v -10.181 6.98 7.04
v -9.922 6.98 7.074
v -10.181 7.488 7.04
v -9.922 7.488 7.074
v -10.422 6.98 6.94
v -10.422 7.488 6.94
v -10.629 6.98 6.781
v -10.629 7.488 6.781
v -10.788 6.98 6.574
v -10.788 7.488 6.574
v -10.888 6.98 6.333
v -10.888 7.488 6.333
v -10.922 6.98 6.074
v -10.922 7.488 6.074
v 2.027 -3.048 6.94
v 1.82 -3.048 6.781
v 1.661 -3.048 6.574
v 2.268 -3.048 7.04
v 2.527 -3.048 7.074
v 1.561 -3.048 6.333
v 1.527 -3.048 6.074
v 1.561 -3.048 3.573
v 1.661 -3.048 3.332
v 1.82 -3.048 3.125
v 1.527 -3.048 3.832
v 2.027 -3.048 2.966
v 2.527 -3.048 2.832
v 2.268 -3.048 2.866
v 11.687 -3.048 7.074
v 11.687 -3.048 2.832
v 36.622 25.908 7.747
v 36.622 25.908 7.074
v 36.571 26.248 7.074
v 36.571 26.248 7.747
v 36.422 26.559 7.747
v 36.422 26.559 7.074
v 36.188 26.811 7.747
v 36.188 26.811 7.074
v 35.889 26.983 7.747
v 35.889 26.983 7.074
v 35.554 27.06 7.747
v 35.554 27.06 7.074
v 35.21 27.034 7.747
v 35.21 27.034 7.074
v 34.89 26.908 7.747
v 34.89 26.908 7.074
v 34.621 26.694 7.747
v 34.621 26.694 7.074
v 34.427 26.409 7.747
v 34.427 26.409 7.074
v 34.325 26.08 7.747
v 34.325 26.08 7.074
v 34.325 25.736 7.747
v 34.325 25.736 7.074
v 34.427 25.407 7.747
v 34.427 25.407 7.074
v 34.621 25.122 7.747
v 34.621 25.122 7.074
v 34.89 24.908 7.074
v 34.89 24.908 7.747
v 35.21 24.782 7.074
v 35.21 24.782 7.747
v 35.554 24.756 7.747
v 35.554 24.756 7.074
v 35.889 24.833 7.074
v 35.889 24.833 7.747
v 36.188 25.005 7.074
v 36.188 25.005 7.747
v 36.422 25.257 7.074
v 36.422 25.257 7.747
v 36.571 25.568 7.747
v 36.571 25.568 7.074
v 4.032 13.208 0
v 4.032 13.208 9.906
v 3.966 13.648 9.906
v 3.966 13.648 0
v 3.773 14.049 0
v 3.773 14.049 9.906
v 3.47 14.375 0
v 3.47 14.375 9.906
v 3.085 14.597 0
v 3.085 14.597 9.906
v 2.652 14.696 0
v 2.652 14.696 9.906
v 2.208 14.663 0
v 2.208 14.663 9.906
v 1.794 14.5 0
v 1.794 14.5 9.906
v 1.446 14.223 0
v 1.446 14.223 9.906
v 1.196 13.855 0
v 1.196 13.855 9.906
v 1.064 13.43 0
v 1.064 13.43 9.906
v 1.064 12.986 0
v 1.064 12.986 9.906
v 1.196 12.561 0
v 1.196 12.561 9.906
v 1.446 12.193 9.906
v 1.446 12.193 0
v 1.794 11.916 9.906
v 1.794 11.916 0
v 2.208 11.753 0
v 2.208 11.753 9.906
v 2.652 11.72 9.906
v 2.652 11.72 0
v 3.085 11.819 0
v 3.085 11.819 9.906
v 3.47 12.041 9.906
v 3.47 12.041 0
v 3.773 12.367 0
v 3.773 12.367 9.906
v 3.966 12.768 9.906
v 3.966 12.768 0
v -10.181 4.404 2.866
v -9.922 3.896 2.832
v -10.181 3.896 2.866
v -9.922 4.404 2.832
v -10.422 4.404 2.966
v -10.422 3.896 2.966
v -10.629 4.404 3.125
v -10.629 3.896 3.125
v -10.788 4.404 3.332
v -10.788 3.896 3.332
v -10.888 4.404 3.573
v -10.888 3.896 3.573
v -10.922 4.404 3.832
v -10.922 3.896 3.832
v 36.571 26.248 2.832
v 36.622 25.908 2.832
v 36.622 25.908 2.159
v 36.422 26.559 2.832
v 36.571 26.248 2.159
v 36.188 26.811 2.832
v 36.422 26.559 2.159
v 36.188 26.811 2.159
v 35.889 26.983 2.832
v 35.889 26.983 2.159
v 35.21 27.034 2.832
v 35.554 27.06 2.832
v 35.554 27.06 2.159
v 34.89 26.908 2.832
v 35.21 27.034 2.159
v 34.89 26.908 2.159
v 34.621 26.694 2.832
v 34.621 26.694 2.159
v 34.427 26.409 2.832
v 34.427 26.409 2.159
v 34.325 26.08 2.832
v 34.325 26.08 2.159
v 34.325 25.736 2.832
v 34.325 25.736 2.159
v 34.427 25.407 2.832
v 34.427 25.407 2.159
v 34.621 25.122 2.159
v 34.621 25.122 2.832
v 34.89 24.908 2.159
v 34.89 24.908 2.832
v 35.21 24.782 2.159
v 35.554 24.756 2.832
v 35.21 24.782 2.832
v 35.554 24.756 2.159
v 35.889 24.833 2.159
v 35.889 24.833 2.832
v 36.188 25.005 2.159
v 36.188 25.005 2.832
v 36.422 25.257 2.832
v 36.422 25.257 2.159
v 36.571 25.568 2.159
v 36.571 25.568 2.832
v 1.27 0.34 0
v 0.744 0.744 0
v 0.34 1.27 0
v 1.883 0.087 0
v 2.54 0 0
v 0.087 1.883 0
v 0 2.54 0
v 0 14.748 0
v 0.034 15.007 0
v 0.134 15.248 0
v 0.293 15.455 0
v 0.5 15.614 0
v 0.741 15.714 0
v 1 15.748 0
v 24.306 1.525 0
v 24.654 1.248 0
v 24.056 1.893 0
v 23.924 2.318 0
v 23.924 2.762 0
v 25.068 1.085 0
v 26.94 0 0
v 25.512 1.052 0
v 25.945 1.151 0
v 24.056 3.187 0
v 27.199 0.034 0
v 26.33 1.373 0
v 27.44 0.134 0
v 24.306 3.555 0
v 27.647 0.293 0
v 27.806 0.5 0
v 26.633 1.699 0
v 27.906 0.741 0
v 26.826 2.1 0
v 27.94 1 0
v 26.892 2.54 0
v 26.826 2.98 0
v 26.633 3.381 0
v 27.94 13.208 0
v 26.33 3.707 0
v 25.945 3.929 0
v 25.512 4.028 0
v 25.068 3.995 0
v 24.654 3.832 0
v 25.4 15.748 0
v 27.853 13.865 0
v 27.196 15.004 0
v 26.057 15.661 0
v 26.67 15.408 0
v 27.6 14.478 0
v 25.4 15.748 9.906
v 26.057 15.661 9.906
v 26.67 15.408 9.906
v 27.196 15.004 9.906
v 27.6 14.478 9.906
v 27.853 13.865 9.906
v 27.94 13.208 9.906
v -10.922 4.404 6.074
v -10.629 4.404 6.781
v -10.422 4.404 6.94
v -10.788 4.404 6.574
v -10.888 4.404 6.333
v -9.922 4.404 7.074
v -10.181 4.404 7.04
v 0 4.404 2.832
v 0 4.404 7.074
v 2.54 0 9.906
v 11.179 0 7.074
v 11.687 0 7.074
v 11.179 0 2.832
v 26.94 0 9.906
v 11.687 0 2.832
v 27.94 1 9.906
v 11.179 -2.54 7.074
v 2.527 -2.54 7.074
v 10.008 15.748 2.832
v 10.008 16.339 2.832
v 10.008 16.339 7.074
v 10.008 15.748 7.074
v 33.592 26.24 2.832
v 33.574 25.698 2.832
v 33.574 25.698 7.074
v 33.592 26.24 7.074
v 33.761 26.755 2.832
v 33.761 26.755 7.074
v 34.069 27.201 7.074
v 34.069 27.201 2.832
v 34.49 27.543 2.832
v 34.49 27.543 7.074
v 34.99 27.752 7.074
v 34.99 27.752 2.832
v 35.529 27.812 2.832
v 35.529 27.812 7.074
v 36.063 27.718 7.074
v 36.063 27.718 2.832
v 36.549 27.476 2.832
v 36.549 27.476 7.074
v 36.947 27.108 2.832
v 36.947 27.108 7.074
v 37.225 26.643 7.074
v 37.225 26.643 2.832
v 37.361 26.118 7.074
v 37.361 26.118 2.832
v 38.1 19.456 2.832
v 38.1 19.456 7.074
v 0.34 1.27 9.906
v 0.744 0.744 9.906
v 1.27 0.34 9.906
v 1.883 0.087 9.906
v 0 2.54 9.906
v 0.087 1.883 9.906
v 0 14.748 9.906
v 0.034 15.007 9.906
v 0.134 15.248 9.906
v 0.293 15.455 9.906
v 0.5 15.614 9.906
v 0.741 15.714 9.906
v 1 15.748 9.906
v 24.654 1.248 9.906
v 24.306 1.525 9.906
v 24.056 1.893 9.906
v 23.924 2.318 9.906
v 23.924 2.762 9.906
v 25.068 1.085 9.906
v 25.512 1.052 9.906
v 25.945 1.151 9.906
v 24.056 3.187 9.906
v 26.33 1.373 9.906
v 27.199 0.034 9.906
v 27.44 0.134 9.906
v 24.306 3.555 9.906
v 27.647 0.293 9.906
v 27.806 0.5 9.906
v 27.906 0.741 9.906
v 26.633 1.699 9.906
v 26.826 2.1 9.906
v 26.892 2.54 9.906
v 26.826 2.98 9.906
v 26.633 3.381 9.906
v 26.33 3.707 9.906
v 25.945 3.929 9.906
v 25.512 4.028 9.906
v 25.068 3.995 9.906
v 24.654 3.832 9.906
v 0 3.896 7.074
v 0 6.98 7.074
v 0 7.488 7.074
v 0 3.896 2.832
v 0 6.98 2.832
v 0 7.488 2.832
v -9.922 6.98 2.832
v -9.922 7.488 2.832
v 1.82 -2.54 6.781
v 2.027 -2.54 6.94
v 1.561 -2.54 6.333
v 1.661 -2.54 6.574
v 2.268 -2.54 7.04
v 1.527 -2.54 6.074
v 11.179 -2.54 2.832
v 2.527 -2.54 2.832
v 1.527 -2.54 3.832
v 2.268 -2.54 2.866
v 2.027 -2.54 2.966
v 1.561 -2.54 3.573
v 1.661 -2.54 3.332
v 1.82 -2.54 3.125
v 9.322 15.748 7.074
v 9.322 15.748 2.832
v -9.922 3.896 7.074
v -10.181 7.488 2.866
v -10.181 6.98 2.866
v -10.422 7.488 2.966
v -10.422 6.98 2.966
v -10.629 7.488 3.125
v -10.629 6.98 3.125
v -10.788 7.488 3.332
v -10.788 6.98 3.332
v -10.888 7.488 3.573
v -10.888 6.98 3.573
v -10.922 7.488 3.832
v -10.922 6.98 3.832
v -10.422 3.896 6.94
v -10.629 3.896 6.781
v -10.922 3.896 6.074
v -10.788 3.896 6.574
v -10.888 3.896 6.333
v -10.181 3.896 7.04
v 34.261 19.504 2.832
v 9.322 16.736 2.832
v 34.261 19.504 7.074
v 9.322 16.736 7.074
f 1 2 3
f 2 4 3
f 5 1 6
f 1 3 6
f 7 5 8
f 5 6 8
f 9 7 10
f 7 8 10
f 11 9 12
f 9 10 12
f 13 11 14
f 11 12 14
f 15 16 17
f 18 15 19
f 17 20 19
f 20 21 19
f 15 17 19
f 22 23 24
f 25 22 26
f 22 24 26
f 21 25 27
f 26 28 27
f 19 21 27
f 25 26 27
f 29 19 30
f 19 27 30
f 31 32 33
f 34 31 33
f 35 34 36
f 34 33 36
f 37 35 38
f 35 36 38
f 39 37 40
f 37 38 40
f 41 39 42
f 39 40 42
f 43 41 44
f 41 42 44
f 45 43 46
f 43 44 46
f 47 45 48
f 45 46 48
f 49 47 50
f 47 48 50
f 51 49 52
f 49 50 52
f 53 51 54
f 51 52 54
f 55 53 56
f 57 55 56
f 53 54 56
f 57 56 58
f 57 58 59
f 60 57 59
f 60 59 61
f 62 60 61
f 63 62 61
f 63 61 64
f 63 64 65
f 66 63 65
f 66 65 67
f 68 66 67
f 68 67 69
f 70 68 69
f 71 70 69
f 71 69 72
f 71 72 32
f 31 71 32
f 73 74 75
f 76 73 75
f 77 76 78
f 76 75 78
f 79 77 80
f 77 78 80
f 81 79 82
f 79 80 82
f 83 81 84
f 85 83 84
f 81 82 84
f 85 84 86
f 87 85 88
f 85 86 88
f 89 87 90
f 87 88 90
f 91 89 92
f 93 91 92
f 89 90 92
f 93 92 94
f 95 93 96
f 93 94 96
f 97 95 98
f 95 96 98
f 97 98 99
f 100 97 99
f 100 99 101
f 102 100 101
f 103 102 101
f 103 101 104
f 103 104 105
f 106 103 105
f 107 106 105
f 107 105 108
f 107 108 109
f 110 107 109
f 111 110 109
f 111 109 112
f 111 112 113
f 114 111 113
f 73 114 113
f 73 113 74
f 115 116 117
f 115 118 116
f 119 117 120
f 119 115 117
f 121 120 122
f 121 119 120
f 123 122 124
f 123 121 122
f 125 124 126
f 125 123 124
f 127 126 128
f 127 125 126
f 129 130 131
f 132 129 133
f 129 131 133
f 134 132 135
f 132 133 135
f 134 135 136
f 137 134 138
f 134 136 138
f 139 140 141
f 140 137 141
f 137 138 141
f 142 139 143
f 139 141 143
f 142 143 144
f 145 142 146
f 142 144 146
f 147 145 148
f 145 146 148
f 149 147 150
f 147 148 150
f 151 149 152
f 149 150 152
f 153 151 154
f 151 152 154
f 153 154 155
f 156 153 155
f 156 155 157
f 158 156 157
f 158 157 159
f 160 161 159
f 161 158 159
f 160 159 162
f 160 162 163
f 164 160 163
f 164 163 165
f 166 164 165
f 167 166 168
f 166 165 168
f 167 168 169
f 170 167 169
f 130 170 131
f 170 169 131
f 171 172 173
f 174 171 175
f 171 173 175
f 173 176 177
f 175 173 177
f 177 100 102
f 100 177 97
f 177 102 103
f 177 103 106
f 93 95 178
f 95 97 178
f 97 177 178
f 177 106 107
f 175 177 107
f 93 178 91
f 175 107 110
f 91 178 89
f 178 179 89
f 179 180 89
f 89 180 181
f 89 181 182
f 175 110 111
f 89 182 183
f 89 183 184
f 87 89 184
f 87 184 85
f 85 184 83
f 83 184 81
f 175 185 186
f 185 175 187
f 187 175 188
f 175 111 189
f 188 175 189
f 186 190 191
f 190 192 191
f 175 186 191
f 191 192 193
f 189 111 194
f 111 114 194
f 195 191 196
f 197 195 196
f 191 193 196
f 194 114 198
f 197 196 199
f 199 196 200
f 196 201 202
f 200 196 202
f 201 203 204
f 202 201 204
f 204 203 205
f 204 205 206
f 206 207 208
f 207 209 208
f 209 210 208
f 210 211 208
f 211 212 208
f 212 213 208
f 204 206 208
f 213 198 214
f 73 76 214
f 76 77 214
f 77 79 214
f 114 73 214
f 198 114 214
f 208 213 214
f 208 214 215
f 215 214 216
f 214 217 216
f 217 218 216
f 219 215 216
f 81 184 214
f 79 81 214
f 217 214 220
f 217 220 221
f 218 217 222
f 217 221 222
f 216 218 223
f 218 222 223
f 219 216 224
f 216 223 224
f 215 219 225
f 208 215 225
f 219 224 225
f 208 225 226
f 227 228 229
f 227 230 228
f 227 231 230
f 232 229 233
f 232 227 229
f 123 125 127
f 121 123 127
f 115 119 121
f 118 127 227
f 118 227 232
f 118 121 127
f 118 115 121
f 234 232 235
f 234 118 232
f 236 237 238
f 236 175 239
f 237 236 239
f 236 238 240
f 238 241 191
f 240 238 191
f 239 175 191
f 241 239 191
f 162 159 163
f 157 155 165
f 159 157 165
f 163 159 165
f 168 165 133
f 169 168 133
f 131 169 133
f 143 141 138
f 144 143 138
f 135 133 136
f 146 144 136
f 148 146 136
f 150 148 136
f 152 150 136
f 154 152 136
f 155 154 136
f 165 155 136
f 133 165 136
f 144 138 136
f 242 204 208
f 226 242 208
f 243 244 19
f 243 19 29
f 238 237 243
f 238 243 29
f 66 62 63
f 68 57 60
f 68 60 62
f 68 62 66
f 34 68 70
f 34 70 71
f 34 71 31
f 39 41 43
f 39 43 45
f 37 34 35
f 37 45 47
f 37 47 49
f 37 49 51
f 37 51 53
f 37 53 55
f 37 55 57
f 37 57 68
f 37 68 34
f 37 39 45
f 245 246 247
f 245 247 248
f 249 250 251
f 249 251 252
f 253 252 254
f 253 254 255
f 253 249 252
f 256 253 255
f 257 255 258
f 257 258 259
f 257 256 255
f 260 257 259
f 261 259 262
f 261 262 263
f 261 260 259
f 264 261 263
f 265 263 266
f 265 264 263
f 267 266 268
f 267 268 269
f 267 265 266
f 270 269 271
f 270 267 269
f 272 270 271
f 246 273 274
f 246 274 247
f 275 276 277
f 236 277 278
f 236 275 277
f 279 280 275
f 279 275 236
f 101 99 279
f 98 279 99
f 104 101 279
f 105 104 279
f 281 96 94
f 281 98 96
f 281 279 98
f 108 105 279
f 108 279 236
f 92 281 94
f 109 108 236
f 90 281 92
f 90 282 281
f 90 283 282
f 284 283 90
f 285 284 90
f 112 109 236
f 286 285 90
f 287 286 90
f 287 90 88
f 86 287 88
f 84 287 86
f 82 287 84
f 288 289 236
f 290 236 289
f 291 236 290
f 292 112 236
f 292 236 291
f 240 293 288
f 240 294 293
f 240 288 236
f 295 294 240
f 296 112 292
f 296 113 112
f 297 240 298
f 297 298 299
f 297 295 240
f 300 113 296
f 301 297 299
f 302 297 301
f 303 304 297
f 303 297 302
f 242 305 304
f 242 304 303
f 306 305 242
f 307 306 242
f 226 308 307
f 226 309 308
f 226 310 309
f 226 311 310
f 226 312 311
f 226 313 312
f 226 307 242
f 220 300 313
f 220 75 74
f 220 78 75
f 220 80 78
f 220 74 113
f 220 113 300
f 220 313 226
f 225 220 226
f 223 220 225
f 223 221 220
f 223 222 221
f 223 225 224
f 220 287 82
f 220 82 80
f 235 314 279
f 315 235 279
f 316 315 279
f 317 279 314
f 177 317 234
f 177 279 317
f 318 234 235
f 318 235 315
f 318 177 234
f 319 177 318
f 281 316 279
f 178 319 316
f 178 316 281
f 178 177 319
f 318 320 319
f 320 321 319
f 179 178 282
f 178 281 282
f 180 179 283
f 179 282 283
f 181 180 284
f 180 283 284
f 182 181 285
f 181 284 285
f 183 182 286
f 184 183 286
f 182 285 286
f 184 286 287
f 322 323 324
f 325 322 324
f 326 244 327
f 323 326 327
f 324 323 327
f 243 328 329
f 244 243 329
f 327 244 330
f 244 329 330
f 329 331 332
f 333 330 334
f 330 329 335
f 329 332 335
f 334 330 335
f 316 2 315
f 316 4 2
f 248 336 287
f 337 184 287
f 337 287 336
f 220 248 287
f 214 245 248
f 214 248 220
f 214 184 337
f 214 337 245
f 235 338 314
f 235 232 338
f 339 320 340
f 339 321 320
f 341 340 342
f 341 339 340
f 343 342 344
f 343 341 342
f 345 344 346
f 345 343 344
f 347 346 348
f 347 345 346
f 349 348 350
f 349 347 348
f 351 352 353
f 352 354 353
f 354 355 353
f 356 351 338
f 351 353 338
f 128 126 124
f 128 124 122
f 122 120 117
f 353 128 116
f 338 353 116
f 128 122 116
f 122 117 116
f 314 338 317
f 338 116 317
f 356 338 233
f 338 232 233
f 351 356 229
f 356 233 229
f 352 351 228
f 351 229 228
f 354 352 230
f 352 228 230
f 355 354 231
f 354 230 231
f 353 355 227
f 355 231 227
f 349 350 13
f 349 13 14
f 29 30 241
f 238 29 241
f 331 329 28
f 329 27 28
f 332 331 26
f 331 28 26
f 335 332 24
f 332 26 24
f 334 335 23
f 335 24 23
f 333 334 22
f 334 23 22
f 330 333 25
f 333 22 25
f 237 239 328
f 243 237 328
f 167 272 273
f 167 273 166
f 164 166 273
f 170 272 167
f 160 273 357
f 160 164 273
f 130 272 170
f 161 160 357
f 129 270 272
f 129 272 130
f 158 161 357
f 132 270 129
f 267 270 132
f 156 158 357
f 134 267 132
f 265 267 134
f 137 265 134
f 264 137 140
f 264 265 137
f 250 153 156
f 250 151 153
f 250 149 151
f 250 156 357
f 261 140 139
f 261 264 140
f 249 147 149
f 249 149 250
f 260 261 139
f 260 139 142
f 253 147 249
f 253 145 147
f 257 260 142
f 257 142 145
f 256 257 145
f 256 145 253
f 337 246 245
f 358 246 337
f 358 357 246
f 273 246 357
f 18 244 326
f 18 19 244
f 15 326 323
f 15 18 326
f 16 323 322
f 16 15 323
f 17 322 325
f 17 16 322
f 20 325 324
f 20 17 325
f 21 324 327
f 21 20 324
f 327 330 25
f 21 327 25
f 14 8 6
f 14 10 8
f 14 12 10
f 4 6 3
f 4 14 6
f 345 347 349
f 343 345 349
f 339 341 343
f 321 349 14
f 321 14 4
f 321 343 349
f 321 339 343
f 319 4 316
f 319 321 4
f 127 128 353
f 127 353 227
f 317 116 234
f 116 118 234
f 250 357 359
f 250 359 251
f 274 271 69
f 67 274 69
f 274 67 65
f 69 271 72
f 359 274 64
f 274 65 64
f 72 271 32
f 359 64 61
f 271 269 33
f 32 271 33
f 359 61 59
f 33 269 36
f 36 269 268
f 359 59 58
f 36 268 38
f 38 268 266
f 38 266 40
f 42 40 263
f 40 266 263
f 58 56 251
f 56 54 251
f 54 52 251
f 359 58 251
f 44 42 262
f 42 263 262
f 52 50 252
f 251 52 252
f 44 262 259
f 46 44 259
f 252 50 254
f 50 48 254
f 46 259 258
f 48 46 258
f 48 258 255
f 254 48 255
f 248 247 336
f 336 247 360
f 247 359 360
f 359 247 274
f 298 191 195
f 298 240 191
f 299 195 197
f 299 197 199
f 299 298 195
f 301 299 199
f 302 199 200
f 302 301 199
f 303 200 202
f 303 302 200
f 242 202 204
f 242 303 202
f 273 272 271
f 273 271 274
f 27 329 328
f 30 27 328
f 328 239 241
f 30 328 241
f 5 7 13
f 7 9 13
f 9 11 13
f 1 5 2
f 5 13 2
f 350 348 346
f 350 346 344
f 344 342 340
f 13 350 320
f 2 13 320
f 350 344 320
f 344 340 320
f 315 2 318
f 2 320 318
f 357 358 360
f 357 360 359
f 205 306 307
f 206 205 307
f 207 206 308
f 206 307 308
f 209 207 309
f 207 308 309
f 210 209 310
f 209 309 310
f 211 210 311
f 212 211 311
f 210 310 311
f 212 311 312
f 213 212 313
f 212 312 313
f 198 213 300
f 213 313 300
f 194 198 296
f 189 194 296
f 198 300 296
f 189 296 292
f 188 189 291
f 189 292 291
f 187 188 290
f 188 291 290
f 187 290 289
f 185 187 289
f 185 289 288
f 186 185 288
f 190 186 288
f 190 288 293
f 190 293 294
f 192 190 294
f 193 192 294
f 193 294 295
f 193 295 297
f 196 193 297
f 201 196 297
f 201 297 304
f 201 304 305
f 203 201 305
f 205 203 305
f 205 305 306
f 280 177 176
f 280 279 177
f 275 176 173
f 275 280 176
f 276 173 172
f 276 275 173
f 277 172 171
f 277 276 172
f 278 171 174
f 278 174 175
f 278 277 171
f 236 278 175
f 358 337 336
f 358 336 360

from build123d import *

# Parameters (mm, degrees)
SKETCH1_W                = 27.94
SKETCH1_H                = 15.748
BOSS_EXTRUDE1_DEPTH      = 9.906
SKETCH2_R                = 1.49225
CUT_EXTRUDE1_DEPTH       = 34.567423792
FILLET1_R                = 2.54
BOSS_EXTRUDE2_DEPTH      = 2.1209
BOSS_EXTRUDE2_DEPTH_BACK = 2.1209
SKETCH3_W                = 10.922
SKETCH3_H                = 0.508
FILLET2_R                = 1
BOSS_EXTRUDE3_DEPTH      = 2.794
BOSS_EXTRUDE3_DEPTH_BACK = 2.794
SKETCH4_R                = 1.155


with BuildPart() as part:
    # Sketch1 → Boss-Extrude1 (new body)
    with BuildSketch(Plane.XY):
        with Locations((13.97, 7.874)):
            Rectangle(SKETCH1_W, SKETCH1_H)
    extrude(amount=BOSS_EXTRUDE1_DEPTH)

    # Sketch2 → Cut-Extrude1 (cut, through all)
    with BuildSketch(Plane.XY.offset(9.906)):
        with Locations((2.54, 13.208)):
            Circle(SKETCH2_R)
        with Locations((25.4, 2.54)):
            Circle(SKETCH2_R)
    extrude(amount=-CUT_EXTRUDE1_DEPTH, mode=Mode.SUBTRACT)

    # Fillet1
    fillet1_edges = [part.edges().sort_by_distance(p)[0] for p in [
        (27.94, 15.748, 4.953),
        (0, 0, 4.953),
    ]]
    fillet(fillet1_edges, radius=FILLET1_R)

    # Sketch3 → Boss-Extrude2 (add, two sides: drawn at the far end of the back side and taken through both)
    with BuildSketch(Plane.XY.offset(4.953).offset(-BOSS_EXTRUDE2_DEPTH_BACK)):
        with BuildLine():
            Line((9.321868026, 15.748), (9.321868026, 16.736327505))
            Line((9.321868026, 16.736327505), (34.261319398, 19.503534314))
            Line((34.261319398, 19.503534314), (33.574009344, 25.69791617))
            ThreePointArc((33.574009344, 25.69791617), (35.257306032, 27.801380518), (37.360770379, 26.11808383))
            Line((37.360770379, 26.11808383), (38.1, 19.455776874))
            Line((38.1, 19.455776874), (10.0081978, 16.338794661))
            Line((10.0081978, 16.338794661), (10.0081978, 15.748))
            Line((10.0081978, 15.748), (9.321868026, 15.748))
        make_face()
        Polygon((11.178880787, 0), (11.178880787, -2.54), (1.526880787, -2.54), (1.526880787, -3.048), (11.686880787, -3.048), (11.686880787, 0), align=None)
        with Locations((-5.461, 4.149928027)):
            Rectangle(SKETCH3_W, SKETCH3_H)
        with Locations((-5.461, 7.23359273)):
            Rectangle(SKETCH3_W, SKETCH3_H)
    extrude(amount=BOSS_EXTRUDE2_DEPTH + BOSS_EXTRUDE2_DEPTH_BACK)

    # Fillet2
    fillet2_edges = [part.edges().sort_by_distance(p)[0] for p in [
        (1.526880787, -2.794, 2.8321),
        (1.526880787, -2.794, 7.0739),
        (-10.922, 4.149928027, 2.8321),
        (-10.922, 4.149928027, 7.0739),
        (0, 15.748, 4.953),
        (27.94, 0, 4.953),
        (-10.922, 7.23359273, 2.8321),
        (-10.922, 7.23359273, 7.0739),
    ]]
    fillet(fillet2_edges, radius=FILLET2_R)

    # Sketch4 → Boss-Extrude3 (add, two sides: drawn at the far end of the back side and taken through both)
    with BuildSketch(Plane.XY.offset(4.953).offset(-BOSS_EXTRUDE3_DEPTH_BACK)):
        with Locations((35.467389862, 25.908)):
            Circle(SKETCH4_R)
    extrude(amount=BOSS_EXTRUDE3_DEPTH + BOSS_EXTRUDE3_DEPTH_BACK)


solid = part.part
